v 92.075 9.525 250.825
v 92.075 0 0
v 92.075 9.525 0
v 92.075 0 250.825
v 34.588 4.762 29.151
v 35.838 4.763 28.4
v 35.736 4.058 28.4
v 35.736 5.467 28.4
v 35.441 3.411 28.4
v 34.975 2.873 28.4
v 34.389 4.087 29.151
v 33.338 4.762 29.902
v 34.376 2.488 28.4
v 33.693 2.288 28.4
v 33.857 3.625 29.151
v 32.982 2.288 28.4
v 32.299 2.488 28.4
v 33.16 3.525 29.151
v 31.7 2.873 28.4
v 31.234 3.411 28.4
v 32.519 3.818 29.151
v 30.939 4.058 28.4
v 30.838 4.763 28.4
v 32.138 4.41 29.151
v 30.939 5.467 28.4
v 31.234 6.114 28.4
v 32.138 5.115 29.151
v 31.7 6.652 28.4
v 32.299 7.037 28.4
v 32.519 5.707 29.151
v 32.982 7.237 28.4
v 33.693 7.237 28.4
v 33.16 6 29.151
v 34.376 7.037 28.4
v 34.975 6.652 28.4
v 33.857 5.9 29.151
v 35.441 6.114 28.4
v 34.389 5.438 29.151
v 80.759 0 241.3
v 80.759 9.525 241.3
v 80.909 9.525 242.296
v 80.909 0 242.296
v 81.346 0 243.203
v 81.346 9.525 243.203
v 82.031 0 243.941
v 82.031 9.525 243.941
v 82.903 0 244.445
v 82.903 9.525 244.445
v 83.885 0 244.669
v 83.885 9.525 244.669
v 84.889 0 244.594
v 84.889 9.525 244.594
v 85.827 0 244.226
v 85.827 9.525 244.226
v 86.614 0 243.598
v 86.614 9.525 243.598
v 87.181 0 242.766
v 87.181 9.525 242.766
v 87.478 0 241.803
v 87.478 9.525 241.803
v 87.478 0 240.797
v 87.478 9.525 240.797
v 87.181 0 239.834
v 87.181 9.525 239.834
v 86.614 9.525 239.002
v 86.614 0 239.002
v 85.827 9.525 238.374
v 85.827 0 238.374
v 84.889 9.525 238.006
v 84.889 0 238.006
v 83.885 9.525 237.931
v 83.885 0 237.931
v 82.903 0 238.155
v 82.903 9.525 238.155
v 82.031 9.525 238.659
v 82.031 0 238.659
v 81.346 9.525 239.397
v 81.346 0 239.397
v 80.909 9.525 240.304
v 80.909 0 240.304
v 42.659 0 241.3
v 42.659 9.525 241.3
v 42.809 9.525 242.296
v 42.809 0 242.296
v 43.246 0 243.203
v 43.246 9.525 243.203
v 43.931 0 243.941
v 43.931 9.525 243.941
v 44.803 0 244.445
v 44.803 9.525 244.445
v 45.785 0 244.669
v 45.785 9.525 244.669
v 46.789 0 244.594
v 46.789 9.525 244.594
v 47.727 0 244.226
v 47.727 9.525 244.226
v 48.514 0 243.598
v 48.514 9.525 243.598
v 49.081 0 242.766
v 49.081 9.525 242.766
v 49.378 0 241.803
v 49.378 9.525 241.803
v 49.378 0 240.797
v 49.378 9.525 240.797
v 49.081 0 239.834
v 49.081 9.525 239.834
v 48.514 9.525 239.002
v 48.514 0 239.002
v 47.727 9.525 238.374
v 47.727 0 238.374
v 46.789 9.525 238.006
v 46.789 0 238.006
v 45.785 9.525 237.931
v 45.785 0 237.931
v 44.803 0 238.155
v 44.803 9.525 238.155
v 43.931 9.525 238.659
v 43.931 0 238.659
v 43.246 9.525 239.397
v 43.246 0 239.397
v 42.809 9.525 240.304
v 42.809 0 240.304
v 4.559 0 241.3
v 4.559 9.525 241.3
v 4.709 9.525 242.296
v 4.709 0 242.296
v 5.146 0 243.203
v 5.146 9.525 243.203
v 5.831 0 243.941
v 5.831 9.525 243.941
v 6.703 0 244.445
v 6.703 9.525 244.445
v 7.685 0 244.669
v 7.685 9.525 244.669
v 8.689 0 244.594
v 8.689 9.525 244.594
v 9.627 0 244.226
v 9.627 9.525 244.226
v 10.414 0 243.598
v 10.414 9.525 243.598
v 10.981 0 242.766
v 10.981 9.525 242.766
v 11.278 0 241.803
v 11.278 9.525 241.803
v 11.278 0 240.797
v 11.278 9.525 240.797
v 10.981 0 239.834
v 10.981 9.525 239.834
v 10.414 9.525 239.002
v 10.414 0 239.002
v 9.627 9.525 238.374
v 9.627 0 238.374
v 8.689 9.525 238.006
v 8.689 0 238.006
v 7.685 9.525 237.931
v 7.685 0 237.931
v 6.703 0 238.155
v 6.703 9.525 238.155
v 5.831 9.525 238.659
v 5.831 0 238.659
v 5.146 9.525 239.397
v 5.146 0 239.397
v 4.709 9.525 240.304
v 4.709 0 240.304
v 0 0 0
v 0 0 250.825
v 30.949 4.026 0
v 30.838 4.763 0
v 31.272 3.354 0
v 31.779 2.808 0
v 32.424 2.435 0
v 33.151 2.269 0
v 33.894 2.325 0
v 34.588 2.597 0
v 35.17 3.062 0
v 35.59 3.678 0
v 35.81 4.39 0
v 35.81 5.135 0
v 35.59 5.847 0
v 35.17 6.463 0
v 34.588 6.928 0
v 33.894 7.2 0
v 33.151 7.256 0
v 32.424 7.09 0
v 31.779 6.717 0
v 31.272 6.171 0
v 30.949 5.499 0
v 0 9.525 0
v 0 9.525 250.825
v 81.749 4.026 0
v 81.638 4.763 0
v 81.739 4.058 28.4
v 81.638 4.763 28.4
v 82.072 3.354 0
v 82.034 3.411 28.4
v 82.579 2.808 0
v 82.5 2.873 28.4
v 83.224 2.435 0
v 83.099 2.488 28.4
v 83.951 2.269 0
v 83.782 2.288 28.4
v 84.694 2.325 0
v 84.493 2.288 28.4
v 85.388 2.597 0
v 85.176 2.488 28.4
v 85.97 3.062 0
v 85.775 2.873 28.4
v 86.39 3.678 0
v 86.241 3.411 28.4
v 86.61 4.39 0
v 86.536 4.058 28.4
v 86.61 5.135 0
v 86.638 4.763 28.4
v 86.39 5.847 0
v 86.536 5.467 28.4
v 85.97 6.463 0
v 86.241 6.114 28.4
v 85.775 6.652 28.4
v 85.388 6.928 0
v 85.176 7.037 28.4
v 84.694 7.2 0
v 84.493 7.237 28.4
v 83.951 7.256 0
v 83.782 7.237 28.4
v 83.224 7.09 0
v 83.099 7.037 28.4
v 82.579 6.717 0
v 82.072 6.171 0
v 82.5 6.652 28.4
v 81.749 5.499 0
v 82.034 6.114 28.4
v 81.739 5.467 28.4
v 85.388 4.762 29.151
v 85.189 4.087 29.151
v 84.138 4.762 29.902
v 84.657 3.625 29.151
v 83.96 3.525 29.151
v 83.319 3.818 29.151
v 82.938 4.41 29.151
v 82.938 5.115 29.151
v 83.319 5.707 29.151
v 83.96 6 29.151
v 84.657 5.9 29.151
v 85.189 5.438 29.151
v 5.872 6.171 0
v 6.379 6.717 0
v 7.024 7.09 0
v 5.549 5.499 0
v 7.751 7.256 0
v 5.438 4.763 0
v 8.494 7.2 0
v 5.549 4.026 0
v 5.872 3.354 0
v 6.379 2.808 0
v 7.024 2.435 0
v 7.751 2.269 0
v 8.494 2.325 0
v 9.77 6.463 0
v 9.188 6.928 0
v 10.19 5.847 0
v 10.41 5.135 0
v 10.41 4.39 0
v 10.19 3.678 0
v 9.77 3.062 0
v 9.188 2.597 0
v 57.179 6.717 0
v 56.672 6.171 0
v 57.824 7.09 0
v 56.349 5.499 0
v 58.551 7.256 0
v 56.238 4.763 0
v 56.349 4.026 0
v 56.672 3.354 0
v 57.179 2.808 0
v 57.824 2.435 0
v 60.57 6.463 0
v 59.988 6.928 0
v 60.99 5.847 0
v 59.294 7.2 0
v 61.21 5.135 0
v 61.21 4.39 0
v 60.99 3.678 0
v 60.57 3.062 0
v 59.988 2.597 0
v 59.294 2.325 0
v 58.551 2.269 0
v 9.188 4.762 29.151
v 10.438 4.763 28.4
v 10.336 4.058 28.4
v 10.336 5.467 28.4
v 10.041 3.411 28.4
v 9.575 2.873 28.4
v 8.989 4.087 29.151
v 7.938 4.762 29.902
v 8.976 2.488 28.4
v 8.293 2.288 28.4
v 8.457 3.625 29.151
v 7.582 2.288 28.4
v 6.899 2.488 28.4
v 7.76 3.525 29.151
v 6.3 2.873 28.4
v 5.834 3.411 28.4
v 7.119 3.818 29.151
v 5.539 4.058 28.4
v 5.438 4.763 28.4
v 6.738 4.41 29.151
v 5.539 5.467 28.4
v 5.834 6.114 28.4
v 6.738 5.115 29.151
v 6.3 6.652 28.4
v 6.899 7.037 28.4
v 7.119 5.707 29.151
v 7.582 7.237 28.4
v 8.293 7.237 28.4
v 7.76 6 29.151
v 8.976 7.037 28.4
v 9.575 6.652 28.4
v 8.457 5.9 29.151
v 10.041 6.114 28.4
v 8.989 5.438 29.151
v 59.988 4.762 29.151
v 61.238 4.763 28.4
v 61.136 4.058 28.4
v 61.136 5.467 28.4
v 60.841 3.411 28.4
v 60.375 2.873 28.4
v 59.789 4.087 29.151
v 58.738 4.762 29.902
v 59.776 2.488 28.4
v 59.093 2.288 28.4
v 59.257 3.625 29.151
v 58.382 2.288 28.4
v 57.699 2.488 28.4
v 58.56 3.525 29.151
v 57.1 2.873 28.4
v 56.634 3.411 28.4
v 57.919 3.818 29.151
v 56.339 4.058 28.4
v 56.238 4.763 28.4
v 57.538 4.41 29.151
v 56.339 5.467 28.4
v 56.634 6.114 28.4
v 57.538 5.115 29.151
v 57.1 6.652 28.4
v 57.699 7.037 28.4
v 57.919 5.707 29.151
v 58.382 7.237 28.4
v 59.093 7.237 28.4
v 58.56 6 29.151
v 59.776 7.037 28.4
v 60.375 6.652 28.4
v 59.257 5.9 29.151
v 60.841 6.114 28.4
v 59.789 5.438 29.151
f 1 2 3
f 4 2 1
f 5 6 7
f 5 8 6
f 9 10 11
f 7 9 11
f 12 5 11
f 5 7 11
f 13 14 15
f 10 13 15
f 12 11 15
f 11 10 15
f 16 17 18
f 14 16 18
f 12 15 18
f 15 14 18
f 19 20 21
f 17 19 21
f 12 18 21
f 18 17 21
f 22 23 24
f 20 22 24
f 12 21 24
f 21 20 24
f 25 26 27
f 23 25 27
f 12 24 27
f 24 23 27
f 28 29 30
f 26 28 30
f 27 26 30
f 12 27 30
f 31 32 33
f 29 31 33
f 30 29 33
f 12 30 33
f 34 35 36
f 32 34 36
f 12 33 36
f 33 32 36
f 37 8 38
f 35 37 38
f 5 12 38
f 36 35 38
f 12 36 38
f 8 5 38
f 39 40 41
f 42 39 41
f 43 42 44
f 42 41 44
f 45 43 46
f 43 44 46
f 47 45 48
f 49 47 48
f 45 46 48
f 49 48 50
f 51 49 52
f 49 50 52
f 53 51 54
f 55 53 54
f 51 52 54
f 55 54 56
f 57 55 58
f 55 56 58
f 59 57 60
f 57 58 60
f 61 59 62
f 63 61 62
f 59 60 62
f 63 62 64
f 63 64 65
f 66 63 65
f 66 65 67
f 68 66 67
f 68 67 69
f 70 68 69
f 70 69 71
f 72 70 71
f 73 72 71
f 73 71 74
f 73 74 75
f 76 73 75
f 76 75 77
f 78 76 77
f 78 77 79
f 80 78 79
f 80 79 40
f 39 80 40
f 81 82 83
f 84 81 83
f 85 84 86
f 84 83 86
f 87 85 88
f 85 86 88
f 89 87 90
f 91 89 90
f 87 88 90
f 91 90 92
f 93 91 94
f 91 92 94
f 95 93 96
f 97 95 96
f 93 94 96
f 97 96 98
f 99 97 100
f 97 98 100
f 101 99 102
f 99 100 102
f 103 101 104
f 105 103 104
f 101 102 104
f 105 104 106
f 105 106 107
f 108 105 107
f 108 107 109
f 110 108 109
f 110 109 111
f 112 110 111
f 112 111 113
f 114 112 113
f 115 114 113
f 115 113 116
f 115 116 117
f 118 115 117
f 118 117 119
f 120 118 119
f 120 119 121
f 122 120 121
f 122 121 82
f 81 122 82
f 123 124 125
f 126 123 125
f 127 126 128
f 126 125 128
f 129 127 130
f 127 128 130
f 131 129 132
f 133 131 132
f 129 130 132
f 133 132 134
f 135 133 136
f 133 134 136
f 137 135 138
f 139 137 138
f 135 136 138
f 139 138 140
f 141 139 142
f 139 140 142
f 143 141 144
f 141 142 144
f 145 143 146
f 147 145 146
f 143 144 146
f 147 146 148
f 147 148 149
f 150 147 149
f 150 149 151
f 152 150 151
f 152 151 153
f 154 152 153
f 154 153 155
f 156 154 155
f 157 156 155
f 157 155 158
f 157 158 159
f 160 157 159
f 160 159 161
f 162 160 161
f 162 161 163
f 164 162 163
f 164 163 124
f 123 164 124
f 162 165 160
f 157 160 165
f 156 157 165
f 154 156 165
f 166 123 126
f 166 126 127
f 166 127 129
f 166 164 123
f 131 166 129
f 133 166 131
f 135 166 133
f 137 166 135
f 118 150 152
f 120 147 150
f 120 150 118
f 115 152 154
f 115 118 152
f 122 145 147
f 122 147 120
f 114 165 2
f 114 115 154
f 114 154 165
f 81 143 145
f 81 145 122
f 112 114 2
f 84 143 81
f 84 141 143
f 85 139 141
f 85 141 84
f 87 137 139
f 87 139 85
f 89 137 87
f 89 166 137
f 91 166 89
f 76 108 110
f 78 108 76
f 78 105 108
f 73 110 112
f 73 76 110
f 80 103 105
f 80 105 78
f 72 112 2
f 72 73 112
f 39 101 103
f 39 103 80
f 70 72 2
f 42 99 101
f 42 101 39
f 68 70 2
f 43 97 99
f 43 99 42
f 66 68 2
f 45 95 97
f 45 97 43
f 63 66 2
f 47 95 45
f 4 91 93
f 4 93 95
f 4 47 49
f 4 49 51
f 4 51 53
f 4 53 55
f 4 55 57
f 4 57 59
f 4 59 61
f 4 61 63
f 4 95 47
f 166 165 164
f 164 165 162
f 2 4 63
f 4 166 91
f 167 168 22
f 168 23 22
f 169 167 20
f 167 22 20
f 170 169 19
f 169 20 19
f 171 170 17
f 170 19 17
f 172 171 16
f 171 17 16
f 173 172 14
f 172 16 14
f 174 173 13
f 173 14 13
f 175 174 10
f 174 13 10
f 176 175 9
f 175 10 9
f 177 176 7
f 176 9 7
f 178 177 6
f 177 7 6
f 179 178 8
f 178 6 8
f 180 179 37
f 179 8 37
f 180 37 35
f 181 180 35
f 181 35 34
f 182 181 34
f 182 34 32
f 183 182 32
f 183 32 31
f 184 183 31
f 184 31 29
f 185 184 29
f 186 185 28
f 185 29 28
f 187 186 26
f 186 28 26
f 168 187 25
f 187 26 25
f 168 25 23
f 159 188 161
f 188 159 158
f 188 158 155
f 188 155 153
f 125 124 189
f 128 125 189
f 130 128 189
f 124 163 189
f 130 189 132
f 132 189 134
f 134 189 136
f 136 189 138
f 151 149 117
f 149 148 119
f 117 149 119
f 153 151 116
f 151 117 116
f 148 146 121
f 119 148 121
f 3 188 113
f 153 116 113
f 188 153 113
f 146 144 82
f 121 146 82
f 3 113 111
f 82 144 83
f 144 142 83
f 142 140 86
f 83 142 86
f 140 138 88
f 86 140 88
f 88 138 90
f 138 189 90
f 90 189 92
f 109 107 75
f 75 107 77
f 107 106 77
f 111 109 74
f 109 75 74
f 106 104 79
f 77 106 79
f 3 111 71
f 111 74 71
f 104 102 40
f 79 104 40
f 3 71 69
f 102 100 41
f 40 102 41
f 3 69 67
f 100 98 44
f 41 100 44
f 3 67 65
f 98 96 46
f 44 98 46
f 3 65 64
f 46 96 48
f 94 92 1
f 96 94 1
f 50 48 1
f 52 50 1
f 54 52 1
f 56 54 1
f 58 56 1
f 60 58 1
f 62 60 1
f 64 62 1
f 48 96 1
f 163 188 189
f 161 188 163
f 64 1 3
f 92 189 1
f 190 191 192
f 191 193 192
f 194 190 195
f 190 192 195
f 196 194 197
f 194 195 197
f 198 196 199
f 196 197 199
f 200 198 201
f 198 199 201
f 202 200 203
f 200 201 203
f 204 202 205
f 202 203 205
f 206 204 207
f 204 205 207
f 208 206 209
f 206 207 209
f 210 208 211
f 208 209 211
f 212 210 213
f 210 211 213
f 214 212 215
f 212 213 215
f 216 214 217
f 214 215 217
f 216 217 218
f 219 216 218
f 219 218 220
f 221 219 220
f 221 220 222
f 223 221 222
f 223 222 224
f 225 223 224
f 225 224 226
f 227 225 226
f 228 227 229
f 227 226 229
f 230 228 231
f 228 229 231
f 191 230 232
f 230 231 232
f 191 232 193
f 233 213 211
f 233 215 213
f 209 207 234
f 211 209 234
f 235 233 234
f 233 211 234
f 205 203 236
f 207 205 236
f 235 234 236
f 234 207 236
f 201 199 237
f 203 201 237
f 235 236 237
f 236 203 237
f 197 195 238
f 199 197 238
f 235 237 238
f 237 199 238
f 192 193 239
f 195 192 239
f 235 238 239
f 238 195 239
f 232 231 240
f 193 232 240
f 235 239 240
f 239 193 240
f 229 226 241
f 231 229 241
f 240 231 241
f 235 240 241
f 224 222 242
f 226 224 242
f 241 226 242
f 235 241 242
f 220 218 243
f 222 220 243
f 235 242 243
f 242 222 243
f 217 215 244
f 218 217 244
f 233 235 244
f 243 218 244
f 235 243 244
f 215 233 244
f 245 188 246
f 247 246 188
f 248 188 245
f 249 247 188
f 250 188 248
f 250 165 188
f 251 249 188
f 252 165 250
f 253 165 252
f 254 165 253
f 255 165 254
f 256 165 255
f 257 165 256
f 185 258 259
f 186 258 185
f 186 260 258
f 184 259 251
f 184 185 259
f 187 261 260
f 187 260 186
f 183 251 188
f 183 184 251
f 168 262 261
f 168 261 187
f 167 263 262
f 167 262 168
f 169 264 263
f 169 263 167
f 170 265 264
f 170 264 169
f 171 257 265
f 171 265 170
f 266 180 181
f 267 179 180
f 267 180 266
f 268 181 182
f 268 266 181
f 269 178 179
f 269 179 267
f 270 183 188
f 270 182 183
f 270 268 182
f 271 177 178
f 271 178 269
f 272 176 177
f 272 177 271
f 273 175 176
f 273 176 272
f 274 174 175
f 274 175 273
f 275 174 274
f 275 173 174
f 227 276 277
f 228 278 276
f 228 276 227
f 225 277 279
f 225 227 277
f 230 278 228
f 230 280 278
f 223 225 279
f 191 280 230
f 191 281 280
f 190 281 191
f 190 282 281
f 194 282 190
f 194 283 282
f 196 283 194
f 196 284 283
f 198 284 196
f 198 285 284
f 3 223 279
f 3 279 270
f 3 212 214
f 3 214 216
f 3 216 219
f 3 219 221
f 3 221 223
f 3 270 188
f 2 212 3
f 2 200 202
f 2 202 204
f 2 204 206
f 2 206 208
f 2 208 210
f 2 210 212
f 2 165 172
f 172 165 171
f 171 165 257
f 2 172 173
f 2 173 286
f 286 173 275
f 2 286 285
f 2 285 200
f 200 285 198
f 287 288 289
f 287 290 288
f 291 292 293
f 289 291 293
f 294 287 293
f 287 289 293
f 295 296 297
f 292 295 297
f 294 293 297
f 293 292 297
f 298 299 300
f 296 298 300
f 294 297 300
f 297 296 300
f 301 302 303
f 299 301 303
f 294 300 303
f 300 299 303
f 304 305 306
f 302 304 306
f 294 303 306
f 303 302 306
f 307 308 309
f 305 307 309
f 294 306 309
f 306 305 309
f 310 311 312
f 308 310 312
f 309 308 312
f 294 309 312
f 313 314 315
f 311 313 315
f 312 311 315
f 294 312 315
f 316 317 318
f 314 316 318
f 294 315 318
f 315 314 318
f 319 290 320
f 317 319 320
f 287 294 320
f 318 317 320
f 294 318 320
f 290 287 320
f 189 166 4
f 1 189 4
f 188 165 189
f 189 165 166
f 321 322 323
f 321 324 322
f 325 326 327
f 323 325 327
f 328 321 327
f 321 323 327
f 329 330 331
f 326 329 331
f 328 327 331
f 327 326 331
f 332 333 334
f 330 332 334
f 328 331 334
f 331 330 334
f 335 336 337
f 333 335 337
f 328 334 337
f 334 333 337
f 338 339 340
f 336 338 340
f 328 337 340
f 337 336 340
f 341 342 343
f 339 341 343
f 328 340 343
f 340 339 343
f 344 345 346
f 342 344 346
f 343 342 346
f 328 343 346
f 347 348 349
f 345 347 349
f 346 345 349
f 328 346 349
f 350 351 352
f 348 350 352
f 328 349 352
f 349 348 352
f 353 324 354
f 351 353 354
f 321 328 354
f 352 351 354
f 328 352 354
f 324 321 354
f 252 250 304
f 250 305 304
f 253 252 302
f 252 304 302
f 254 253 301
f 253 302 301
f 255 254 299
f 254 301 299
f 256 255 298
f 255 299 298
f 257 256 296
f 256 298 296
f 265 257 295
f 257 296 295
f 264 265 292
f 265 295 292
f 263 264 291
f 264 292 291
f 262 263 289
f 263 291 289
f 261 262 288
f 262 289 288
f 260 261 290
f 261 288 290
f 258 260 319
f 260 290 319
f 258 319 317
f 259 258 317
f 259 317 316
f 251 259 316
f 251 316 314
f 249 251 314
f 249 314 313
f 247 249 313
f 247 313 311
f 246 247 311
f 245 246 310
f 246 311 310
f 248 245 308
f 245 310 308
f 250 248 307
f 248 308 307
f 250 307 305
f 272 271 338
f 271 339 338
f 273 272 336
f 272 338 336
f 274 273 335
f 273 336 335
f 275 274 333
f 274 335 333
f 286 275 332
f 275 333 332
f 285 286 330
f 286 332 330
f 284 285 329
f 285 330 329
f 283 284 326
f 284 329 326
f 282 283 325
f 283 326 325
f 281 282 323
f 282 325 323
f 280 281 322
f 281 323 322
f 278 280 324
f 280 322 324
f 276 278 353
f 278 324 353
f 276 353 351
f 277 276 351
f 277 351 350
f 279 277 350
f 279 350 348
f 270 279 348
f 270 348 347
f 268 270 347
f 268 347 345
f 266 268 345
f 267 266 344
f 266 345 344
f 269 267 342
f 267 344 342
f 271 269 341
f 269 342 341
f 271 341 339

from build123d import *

# Parameters (mm, degrees)
F0_W     = 92.075
F0_H     = 250.825
F1_DEPTH = 9.525
F3_D     = 6.7564
F5_D     = 5
F5_DEPTH = 28.4
F5_TIP   = 1.5021515476


# Not quite as in the source:
# - a feature names something its author has since deleted; it is built from what else it names


with BuildPart() as f1:
    # F0 (on Front) → F1 (new body)
    with BuildSketch(Plane.XZ):
        with Locations((46.0375, 125.4125)):
            Rectangle(F0_W, F0_H)
    extrude(amount=-F1_DEPTH)

    # F3 (through all)
    with Locations(Plane.XZ):
        with Locations((46.0375, 241.3), (84.1375, 241.3), (7.9375, 241.3)):
            Hole(F3_D / 2)

    # F5
    with Locations(Plane(origin=(0, 0, 0), x_dir=(1, 0, 0), z_dir=(0, 0, -1))):
        with Locations((7.9375, -4.7625), (33.3375, -4.7625), (58.7375, -4.7625), (84.1375, -4.7625), (109.5375, -4.7625), (134.9375, -4.7625)):
            Hole(F5_D / 2, depth=F5_DEPTH)
            with Locations((0, 0, -(F5_DEPTH + F5_TIP / 2))):  # 118° drill point
                Cone(0, F5_D / 2, F5_TIP, mode=Mode.SUBTRACT)


solid = f1.part
